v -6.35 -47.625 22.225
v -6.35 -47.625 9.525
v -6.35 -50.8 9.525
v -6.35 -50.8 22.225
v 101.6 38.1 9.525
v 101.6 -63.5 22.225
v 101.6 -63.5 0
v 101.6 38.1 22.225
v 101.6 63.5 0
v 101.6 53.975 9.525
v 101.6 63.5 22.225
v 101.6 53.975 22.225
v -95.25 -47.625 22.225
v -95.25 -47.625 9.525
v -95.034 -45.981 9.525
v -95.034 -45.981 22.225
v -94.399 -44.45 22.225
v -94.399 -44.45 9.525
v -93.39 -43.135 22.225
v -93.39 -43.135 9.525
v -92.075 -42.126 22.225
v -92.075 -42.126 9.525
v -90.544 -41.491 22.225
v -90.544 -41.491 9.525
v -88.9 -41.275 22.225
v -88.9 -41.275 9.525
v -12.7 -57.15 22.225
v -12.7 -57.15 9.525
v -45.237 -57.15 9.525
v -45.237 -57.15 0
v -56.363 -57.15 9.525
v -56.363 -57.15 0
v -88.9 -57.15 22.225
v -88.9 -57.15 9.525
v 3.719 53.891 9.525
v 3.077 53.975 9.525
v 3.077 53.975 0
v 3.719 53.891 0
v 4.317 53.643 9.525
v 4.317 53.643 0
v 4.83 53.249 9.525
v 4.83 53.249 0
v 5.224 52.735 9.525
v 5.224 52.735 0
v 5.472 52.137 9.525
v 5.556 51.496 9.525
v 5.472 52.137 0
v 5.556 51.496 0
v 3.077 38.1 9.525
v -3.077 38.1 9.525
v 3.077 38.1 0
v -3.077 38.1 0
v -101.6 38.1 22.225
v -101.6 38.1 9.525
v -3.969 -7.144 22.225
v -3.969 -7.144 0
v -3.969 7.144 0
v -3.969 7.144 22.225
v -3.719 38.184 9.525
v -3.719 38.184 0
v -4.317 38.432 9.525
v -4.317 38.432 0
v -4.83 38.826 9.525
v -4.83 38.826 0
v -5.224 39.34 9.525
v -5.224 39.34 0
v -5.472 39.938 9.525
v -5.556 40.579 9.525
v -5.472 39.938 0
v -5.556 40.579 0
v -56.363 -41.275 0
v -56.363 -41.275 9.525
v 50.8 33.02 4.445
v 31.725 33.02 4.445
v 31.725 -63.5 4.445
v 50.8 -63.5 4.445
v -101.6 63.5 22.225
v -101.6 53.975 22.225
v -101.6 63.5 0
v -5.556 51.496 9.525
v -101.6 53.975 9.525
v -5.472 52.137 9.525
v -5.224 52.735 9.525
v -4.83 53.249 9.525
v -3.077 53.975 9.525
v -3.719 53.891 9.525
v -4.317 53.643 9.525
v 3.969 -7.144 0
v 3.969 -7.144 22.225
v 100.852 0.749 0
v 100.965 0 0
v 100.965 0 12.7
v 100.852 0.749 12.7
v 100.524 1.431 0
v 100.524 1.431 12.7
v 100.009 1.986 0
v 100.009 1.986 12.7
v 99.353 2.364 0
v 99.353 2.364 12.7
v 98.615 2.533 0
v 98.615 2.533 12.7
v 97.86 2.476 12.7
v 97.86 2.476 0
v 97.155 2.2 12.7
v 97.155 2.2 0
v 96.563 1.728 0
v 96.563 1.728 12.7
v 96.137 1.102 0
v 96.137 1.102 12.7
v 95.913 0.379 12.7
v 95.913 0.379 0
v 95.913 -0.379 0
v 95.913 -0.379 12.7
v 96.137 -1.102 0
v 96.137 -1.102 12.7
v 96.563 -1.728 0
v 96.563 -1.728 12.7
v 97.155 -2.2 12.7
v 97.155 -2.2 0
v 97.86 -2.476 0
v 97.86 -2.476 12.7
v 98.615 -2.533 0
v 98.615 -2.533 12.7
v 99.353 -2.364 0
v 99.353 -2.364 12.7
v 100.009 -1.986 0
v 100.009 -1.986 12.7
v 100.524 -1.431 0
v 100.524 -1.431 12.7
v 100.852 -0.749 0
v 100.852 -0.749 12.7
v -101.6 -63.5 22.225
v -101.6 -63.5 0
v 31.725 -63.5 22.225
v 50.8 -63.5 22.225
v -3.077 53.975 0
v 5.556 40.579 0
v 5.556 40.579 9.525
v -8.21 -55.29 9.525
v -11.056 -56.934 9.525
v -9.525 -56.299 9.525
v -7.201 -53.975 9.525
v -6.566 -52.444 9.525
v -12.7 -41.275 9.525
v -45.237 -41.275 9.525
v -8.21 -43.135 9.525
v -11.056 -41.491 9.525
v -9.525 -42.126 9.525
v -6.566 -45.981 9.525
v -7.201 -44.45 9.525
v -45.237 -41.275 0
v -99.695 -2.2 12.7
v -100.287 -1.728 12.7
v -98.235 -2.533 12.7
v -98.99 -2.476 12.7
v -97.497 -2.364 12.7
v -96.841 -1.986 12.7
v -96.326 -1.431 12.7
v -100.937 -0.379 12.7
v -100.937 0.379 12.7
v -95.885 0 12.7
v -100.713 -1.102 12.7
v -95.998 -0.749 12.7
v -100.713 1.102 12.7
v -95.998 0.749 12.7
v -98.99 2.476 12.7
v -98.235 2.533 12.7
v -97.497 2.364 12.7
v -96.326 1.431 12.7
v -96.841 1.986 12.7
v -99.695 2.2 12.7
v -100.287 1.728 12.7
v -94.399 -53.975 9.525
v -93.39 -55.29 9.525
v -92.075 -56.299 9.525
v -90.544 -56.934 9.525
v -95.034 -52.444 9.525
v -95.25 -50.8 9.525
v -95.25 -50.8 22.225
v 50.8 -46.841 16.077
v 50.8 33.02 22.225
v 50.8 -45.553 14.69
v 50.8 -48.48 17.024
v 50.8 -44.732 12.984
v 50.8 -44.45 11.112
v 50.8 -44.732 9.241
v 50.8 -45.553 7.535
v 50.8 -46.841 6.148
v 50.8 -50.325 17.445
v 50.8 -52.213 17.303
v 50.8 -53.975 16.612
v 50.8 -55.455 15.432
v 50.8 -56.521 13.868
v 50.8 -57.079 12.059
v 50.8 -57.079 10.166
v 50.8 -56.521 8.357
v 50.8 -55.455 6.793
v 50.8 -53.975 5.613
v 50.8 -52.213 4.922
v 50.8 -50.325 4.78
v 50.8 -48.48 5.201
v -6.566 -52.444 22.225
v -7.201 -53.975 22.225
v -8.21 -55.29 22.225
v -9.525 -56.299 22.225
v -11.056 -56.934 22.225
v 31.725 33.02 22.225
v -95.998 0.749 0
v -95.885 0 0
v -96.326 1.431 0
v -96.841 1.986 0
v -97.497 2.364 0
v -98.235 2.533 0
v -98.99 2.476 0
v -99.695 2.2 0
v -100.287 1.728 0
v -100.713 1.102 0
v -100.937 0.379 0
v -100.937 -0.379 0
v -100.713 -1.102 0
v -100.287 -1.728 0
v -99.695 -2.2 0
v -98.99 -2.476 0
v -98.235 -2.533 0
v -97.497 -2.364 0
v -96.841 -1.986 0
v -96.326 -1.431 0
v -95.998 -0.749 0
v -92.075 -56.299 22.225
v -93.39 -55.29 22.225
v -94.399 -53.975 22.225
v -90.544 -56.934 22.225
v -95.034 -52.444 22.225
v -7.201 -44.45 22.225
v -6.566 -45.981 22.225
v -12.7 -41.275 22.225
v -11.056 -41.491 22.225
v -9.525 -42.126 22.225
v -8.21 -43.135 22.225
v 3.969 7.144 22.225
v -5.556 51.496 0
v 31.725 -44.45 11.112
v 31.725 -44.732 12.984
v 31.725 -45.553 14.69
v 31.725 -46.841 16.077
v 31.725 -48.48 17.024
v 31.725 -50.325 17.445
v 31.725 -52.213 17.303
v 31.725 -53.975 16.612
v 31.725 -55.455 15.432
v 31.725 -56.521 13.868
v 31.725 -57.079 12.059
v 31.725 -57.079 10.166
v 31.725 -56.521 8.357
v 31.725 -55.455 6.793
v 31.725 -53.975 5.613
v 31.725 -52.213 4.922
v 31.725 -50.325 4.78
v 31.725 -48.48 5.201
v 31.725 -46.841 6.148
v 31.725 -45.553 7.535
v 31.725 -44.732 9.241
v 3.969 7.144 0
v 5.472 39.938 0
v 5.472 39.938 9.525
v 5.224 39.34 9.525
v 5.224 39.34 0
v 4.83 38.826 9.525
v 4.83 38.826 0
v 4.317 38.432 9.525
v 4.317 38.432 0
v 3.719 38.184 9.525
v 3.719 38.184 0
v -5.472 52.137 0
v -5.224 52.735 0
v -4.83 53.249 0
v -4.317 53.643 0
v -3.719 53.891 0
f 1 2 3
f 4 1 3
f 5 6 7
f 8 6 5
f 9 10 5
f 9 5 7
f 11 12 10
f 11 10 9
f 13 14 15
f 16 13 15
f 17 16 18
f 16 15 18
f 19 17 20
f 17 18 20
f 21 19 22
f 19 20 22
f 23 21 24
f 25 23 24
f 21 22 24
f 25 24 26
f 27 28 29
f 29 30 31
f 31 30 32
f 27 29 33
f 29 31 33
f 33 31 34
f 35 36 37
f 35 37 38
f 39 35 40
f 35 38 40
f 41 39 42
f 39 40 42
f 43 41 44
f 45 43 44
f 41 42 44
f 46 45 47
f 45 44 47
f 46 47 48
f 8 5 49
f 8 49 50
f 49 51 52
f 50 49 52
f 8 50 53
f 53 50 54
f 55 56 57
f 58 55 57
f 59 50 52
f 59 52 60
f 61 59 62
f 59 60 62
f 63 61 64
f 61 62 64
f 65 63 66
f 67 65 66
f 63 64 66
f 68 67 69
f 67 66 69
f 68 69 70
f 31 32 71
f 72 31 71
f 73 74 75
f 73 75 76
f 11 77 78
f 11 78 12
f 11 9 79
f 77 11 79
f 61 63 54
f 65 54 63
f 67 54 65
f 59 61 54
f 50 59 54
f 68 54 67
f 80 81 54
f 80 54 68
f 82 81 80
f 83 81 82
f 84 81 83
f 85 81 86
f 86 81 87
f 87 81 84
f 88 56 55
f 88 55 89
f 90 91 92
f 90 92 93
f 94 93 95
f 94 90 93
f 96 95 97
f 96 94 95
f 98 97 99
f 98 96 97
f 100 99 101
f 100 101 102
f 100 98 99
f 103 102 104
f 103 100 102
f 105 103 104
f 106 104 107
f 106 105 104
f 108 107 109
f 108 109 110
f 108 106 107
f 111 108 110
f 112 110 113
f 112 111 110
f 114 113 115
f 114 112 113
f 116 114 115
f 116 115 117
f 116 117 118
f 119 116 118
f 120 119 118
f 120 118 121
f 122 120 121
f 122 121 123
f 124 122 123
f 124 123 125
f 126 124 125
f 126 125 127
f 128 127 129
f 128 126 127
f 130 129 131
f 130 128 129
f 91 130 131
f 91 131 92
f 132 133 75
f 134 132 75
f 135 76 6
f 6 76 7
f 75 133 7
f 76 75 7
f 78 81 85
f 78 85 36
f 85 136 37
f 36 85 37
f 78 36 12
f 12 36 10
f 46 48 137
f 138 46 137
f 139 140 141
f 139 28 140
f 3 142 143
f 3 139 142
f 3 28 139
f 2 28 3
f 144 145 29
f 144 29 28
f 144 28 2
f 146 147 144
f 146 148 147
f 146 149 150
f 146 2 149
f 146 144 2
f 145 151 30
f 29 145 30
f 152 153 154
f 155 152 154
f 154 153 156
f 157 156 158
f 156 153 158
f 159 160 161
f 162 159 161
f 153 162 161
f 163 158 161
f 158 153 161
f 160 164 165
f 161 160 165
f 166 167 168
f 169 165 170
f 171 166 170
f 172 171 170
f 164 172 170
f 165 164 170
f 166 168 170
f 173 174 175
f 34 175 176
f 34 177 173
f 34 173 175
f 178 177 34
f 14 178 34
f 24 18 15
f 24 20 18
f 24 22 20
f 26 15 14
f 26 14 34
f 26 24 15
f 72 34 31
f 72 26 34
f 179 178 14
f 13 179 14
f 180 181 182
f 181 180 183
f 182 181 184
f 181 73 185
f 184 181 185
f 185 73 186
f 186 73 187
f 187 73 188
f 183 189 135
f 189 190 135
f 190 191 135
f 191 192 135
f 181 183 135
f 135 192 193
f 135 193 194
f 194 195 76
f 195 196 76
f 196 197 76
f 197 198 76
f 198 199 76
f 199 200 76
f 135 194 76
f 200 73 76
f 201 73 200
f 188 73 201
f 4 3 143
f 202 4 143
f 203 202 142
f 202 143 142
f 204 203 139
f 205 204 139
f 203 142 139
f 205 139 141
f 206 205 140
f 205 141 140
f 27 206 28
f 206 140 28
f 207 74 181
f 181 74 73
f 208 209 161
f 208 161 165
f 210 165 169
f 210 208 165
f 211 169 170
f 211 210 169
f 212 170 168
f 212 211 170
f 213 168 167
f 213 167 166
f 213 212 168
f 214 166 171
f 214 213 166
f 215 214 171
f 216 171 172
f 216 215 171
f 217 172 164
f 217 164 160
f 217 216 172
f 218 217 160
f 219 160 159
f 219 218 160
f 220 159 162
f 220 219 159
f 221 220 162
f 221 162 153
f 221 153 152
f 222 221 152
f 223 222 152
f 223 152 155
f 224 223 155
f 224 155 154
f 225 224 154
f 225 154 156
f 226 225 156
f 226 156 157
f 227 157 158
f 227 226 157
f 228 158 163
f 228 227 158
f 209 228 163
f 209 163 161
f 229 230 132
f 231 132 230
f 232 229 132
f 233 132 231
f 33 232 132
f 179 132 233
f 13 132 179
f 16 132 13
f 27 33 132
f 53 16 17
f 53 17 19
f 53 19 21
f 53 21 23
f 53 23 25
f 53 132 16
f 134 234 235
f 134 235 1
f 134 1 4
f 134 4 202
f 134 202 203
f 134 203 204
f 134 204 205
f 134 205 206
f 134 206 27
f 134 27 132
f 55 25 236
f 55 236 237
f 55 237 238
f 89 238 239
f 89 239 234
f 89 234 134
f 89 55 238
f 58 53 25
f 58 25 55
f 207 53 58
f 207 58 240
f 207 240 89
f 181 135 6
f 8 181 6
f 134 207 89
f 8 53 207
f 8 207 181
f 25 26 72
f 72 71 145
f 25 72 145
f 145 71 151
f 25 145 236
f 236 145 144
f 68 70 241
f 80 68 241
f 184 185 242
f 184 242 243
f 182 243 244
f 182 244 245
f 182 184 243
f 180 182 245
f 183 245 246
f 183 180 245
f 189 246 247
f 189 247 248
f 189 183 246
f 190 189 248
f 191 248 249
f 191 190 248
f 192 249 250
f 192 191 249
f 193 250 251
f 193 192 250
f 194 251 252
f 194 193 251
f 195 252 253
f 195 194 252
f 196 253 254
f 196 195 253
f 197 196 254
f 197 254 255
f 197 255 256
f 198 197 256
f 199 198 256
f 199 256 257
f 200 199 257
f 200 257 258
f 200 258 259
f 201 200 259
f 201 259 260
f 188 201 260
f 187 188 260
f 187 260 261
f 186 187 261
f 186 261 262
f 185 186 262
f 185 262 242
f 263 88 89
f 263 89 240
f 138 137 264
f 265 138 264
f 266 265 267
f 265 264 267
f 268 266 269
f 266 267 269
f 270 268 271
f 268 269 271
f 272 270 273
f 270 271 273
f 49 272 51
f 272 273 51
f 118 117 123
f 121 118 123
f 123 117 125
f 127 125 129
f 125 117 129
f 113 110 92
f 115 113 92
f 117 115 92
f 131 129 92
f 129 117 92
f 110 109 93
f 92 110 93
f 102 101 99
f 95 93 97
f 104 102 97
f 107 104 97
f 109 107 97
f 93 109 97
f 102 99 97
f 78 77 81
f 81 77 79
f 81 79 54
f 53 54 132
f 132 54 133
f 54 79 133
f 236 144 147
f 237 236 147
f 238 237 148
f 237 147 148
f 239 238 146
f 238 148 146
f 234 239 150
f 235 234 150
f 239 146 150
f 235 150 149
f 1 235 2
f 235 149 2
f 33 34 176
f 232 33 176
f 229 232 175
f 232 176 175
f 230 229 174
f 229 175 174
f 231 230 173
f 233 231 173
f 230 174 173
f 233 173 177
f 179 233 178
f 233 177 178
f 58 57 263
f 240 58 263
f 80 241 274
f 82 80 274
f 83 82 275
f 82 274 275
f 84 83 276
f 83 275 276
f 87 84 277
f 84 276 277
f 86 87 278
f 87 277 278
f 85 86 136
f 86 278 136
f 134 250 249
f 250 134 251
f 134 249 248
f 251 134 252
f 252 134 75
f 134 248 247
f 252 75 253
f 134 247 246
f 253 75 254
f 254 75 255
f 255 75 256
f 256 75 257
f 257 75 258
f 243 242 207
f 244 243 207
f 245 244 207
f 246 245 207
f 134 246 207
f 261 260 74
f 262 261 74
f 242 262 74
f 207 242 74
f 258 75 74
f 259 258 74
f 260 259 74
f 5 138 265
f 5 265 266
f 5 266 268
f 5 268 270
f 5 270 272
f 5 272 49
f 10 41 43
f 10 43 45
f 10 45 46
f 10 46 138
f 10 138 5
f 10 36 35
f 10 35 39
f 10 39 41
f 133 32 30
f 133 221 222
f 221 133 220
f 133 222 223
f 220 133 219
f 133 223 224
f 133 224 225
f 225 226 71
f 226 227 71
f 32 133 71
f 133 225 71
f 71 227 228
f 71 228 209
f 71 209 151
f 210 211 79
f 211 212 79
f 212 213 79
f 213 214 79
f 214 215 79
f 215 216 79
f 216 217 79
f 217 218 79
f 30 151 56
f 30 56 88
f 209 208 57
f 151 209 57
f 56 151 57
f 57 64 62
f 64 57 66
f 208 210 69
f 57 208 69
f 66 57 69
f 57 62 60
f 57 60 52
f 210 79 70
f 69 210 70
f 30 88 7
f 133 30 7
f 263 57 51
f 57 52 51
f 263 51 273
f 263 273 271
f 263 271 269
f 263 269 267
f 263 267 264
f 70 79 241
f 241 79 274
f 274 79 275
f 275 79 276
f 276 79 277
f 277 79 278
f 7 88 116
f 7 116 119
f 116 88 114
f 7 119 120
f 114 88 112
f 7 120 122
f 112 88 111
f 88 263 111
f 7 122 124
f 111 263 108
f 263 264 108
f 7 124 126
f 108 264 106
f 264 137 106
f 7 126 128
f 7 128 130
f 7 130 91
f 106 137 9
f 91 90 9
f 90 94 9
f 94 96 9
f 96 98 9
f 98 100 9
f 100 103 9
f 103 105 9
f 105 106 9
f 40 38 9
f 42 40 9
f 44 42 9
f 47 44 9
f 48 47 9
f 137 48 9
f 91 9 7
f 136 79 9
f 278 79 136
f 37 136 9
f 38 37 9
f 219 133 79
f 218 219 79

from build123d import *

# Parameters (mm, degrees)
F0_W     = 7.9375
F0_H     = 14.2875
F1_DEPTH = 9.525
F2_DEPTH = 22.225
F3_R     = 6.35
F4_DEPTH = 80.518
F0_W_2   = 19.0754
F0_H_2   = 96.52
F5_DEPTH = 4.445
F6_R     = 2.54
F7_DEPTH = 12.7


with BuildPart() as f1:
    # F0 (on Top) → F1 (new body)
    with BuildSketch(Plane.XY):
        Polygon((-101.6, 38.1), (-101.6, -63.5), (31.7246, -63.5), (31.7246, 33.02), (50.8, 33.02), (50.8, -63.5), (101.6, -63.5), (101.6, 38.1), (3.0768760622, 38.1), (-3.0768760622, 38.1), align=None)
        with BuildLine():
            Line((-56.3626, -57.15), (-88.9, -57.15))
            ThreePointArc((-88.9, -57.15), (-93.3901280605, -55.2901280605), (-95.25, -50.8))
            Line((-95.25, -50.8), (-95.25, -47.625))
            ThreePointArc((-95.25, -47.625), (-93.3901280605, -43.1348719395), (-88.9, -41.275))
            Line((-88.9, -41.275), (-56.3626, -41.275))
            Line((-56.3626, -41.275), (-45.2374, -41.275))
            Line((-45.2374, -41.275), (-12.7, -41.275))
            ThreePointArc((-12.7, -41.275), (-8.2098719395, -43.1348719395), (-6.35, -47.625))
            Line((-6.35, -47.625), (-6.35, -50.8))
            ThreePointArc((-6.35, -50.8), (-8.2098719395, -55.2901280605), (-12.7, -57.15))
            Line((-12.7, -57.15), (-45.2374, -57.15))
            Line((-45.2374, -57.15), (-56.3626, -57.15))
        make_face(mode=Mode.SUBTRACT)
        Rectangle(F0_W, F0_H, mode=Mode.SUBTRACT)
        Polygon((-101.6, 63.5), (-101.6, 53.975), (-3.0768760622, 53.975), (3.0768760622, 53.975), (101.6, 53.975), (101.6, 63.5), align=None)
        with BuildLine():
            Line((-101.6, 53.975), (-101.6, 38.1))
            Line((-101.6, 38.1), (-3.0768760622, 38.1))
            ThreePointArc((-3.0768760622, 38.1), (-4.8300581867, 38.8261918133), (-5.55625, 40.5793739378))
            Line((-5.55625, 40.5793739378), (-5.55625, 51.4956260622))
            ThreePointArc((-5.55625, 51.4956260622), (-4.8300581867, 53.2488081867), (-3.0768760622, 53.975))
            Line((-3.0768760622, 53.975), (-101.6, 53.975))
        make_face()
        with BuildLine():
            ThreePointArc((5.55625, 40.5793739378), (4.8300581867, 38.8261918133), (3.0768760622, 38.1))
            Line((3.0768760622, 38.1), (101.6, 38.1))
            Line((101.6, 38.1), (101.6, 53.975))
            Line((101.6, 53.975), (3.0768760622, 53.975))
            ThreePointArc((3.0768760622, 53.975), (4.8300581867, 53.2488081867), (5.55625, 51.4956260622))
            Line((5.55625, 51.4956260622), (5.55625, 40.5793739378))
        make_face()
        with BuildLine():
            ThreePointArc((-95.25, -50.8), (-93.3901280605, -55.2901280605), (-88.9, -57.15))
            Line((-88.9, -57.15), (-56.3626, -57.15))
            Line((-56.3626, -57.15), (-56.3626, -41.275))
            Line((-56.3626, -41.275), (-88.9, -41.275))
            ThreePointArc((-88.9, -41.275), (-93.3901280605, -43.1348719395), (-95.25, -47.625))
            Line((-95.25, -47.625), (-95.25, -50.8))
        make_face()
        with BuildLine():
            Line((-45.2374, -41.275), (-45.2374, -57.15))
            Line((-45.2374, -57.15), (-12.7, -57.15))
            ThreePointArc((-12.7, -57.15), (-8.2098719395, -55.2901280605), (-6.35, -50.8))
            Line((-6.35, -50.8), (-6.35, -47.625))
            ThreePointArc((-6.35, -47.625), (-8.2098719395, -43.1348719395), (-12.7, -41.275))
            Line((-12.7, -41.275), (-45.2374, -41.275))
        make_face()
    extrude(amount=F1_DEPTH)

    # F0 (on Top) → F2 (join)
    with BuildSketch(Plane.XY):
        Polygon((-101.6, 63.5), (-101.6, 53.975), (-3.0768760622, 53.975), (3.0768760622, 53.975), (101.6, 53.975), (101.6, 63.5), align=None)
        Polygon((-101.6, 38.1), (-101.6, -63.5), (31.7246, -63.5), (31.7246, 33.02), (50.8, 33.02), (50.8, -63.5), (101.6, -63.5), (101.6, 38.1), (3.0768760622, 38.1), (-3.0768760622, 38.1), align=None)
        with BuildLine():
            Line((-56.3626, -57.15), (-88.9, -57.15))
            ThreePointArc((-88.9, -57.15), (-93.3901280605, -55.2901280605), (-95.25, -50.8))
            Line((-95.25, -50.8), (-95.25, -47.625))
            ThreePointArc((-95.25, -47.625), (-93.3901280605, -43.1348719395), (-88.9, -41.275))
            Line((-88.9, -41.275), (-56.3626, -41.275))
            Line((-56.3626, -41.275), (-45.2374, -41.275))
            Line((-45.2374, -41.275), (-12.7, -41.275))
            ThreePointArc((-12.7, -41.275), (-8.2098719395, -43.1348719395), (-6.35, -47.625))
            Line((-6.35, -47.625), (-6.35, -50.8))
            ThreePointArc((-6.35, -50.8), (-8.2098719395, -55.2901280605), (-12.7, -57.15))
            Line((-12.7, -57.15), (-45.2374, -57.15))
            Line((-45.2374, -57.15), (-56.3626, -57.15))
        make_face(mode=Mode.SUBTRACT)
        Rectangle(F0_W, F0_H, mode=Mode.SUBTRACT)
    extrude(amount=F2_DEPTH)

    # F3 (on face) → F4 (join)
    with BuildSketch(Plane.YZ.offset(101.6)):
        with Locations((-50.8, 11.1125)):
            Circle(F3_R)
    extrude(amount=-F4_DEPTH)

    # F0 (on Top) → F5 (join)
    with BuildSketch(Plane.XY):
        with Locations((41.2623, -15.24)):
            Rectangle(F0_W_2, F0_H_2)
    extrude(amount=F5_DEPTH)

    # F6 (on face) → F7 (cut)
    with BuildSketch(Plane.XY):
        with Locations((-98.425, 0)):
            Circle(F6_R)
        with Locations((98.425, 0)):
            Circle(F6_R)
    extrude(amount=F7_DEPTH, mode=Mode.SUBTRACT)


solid = f1.part
